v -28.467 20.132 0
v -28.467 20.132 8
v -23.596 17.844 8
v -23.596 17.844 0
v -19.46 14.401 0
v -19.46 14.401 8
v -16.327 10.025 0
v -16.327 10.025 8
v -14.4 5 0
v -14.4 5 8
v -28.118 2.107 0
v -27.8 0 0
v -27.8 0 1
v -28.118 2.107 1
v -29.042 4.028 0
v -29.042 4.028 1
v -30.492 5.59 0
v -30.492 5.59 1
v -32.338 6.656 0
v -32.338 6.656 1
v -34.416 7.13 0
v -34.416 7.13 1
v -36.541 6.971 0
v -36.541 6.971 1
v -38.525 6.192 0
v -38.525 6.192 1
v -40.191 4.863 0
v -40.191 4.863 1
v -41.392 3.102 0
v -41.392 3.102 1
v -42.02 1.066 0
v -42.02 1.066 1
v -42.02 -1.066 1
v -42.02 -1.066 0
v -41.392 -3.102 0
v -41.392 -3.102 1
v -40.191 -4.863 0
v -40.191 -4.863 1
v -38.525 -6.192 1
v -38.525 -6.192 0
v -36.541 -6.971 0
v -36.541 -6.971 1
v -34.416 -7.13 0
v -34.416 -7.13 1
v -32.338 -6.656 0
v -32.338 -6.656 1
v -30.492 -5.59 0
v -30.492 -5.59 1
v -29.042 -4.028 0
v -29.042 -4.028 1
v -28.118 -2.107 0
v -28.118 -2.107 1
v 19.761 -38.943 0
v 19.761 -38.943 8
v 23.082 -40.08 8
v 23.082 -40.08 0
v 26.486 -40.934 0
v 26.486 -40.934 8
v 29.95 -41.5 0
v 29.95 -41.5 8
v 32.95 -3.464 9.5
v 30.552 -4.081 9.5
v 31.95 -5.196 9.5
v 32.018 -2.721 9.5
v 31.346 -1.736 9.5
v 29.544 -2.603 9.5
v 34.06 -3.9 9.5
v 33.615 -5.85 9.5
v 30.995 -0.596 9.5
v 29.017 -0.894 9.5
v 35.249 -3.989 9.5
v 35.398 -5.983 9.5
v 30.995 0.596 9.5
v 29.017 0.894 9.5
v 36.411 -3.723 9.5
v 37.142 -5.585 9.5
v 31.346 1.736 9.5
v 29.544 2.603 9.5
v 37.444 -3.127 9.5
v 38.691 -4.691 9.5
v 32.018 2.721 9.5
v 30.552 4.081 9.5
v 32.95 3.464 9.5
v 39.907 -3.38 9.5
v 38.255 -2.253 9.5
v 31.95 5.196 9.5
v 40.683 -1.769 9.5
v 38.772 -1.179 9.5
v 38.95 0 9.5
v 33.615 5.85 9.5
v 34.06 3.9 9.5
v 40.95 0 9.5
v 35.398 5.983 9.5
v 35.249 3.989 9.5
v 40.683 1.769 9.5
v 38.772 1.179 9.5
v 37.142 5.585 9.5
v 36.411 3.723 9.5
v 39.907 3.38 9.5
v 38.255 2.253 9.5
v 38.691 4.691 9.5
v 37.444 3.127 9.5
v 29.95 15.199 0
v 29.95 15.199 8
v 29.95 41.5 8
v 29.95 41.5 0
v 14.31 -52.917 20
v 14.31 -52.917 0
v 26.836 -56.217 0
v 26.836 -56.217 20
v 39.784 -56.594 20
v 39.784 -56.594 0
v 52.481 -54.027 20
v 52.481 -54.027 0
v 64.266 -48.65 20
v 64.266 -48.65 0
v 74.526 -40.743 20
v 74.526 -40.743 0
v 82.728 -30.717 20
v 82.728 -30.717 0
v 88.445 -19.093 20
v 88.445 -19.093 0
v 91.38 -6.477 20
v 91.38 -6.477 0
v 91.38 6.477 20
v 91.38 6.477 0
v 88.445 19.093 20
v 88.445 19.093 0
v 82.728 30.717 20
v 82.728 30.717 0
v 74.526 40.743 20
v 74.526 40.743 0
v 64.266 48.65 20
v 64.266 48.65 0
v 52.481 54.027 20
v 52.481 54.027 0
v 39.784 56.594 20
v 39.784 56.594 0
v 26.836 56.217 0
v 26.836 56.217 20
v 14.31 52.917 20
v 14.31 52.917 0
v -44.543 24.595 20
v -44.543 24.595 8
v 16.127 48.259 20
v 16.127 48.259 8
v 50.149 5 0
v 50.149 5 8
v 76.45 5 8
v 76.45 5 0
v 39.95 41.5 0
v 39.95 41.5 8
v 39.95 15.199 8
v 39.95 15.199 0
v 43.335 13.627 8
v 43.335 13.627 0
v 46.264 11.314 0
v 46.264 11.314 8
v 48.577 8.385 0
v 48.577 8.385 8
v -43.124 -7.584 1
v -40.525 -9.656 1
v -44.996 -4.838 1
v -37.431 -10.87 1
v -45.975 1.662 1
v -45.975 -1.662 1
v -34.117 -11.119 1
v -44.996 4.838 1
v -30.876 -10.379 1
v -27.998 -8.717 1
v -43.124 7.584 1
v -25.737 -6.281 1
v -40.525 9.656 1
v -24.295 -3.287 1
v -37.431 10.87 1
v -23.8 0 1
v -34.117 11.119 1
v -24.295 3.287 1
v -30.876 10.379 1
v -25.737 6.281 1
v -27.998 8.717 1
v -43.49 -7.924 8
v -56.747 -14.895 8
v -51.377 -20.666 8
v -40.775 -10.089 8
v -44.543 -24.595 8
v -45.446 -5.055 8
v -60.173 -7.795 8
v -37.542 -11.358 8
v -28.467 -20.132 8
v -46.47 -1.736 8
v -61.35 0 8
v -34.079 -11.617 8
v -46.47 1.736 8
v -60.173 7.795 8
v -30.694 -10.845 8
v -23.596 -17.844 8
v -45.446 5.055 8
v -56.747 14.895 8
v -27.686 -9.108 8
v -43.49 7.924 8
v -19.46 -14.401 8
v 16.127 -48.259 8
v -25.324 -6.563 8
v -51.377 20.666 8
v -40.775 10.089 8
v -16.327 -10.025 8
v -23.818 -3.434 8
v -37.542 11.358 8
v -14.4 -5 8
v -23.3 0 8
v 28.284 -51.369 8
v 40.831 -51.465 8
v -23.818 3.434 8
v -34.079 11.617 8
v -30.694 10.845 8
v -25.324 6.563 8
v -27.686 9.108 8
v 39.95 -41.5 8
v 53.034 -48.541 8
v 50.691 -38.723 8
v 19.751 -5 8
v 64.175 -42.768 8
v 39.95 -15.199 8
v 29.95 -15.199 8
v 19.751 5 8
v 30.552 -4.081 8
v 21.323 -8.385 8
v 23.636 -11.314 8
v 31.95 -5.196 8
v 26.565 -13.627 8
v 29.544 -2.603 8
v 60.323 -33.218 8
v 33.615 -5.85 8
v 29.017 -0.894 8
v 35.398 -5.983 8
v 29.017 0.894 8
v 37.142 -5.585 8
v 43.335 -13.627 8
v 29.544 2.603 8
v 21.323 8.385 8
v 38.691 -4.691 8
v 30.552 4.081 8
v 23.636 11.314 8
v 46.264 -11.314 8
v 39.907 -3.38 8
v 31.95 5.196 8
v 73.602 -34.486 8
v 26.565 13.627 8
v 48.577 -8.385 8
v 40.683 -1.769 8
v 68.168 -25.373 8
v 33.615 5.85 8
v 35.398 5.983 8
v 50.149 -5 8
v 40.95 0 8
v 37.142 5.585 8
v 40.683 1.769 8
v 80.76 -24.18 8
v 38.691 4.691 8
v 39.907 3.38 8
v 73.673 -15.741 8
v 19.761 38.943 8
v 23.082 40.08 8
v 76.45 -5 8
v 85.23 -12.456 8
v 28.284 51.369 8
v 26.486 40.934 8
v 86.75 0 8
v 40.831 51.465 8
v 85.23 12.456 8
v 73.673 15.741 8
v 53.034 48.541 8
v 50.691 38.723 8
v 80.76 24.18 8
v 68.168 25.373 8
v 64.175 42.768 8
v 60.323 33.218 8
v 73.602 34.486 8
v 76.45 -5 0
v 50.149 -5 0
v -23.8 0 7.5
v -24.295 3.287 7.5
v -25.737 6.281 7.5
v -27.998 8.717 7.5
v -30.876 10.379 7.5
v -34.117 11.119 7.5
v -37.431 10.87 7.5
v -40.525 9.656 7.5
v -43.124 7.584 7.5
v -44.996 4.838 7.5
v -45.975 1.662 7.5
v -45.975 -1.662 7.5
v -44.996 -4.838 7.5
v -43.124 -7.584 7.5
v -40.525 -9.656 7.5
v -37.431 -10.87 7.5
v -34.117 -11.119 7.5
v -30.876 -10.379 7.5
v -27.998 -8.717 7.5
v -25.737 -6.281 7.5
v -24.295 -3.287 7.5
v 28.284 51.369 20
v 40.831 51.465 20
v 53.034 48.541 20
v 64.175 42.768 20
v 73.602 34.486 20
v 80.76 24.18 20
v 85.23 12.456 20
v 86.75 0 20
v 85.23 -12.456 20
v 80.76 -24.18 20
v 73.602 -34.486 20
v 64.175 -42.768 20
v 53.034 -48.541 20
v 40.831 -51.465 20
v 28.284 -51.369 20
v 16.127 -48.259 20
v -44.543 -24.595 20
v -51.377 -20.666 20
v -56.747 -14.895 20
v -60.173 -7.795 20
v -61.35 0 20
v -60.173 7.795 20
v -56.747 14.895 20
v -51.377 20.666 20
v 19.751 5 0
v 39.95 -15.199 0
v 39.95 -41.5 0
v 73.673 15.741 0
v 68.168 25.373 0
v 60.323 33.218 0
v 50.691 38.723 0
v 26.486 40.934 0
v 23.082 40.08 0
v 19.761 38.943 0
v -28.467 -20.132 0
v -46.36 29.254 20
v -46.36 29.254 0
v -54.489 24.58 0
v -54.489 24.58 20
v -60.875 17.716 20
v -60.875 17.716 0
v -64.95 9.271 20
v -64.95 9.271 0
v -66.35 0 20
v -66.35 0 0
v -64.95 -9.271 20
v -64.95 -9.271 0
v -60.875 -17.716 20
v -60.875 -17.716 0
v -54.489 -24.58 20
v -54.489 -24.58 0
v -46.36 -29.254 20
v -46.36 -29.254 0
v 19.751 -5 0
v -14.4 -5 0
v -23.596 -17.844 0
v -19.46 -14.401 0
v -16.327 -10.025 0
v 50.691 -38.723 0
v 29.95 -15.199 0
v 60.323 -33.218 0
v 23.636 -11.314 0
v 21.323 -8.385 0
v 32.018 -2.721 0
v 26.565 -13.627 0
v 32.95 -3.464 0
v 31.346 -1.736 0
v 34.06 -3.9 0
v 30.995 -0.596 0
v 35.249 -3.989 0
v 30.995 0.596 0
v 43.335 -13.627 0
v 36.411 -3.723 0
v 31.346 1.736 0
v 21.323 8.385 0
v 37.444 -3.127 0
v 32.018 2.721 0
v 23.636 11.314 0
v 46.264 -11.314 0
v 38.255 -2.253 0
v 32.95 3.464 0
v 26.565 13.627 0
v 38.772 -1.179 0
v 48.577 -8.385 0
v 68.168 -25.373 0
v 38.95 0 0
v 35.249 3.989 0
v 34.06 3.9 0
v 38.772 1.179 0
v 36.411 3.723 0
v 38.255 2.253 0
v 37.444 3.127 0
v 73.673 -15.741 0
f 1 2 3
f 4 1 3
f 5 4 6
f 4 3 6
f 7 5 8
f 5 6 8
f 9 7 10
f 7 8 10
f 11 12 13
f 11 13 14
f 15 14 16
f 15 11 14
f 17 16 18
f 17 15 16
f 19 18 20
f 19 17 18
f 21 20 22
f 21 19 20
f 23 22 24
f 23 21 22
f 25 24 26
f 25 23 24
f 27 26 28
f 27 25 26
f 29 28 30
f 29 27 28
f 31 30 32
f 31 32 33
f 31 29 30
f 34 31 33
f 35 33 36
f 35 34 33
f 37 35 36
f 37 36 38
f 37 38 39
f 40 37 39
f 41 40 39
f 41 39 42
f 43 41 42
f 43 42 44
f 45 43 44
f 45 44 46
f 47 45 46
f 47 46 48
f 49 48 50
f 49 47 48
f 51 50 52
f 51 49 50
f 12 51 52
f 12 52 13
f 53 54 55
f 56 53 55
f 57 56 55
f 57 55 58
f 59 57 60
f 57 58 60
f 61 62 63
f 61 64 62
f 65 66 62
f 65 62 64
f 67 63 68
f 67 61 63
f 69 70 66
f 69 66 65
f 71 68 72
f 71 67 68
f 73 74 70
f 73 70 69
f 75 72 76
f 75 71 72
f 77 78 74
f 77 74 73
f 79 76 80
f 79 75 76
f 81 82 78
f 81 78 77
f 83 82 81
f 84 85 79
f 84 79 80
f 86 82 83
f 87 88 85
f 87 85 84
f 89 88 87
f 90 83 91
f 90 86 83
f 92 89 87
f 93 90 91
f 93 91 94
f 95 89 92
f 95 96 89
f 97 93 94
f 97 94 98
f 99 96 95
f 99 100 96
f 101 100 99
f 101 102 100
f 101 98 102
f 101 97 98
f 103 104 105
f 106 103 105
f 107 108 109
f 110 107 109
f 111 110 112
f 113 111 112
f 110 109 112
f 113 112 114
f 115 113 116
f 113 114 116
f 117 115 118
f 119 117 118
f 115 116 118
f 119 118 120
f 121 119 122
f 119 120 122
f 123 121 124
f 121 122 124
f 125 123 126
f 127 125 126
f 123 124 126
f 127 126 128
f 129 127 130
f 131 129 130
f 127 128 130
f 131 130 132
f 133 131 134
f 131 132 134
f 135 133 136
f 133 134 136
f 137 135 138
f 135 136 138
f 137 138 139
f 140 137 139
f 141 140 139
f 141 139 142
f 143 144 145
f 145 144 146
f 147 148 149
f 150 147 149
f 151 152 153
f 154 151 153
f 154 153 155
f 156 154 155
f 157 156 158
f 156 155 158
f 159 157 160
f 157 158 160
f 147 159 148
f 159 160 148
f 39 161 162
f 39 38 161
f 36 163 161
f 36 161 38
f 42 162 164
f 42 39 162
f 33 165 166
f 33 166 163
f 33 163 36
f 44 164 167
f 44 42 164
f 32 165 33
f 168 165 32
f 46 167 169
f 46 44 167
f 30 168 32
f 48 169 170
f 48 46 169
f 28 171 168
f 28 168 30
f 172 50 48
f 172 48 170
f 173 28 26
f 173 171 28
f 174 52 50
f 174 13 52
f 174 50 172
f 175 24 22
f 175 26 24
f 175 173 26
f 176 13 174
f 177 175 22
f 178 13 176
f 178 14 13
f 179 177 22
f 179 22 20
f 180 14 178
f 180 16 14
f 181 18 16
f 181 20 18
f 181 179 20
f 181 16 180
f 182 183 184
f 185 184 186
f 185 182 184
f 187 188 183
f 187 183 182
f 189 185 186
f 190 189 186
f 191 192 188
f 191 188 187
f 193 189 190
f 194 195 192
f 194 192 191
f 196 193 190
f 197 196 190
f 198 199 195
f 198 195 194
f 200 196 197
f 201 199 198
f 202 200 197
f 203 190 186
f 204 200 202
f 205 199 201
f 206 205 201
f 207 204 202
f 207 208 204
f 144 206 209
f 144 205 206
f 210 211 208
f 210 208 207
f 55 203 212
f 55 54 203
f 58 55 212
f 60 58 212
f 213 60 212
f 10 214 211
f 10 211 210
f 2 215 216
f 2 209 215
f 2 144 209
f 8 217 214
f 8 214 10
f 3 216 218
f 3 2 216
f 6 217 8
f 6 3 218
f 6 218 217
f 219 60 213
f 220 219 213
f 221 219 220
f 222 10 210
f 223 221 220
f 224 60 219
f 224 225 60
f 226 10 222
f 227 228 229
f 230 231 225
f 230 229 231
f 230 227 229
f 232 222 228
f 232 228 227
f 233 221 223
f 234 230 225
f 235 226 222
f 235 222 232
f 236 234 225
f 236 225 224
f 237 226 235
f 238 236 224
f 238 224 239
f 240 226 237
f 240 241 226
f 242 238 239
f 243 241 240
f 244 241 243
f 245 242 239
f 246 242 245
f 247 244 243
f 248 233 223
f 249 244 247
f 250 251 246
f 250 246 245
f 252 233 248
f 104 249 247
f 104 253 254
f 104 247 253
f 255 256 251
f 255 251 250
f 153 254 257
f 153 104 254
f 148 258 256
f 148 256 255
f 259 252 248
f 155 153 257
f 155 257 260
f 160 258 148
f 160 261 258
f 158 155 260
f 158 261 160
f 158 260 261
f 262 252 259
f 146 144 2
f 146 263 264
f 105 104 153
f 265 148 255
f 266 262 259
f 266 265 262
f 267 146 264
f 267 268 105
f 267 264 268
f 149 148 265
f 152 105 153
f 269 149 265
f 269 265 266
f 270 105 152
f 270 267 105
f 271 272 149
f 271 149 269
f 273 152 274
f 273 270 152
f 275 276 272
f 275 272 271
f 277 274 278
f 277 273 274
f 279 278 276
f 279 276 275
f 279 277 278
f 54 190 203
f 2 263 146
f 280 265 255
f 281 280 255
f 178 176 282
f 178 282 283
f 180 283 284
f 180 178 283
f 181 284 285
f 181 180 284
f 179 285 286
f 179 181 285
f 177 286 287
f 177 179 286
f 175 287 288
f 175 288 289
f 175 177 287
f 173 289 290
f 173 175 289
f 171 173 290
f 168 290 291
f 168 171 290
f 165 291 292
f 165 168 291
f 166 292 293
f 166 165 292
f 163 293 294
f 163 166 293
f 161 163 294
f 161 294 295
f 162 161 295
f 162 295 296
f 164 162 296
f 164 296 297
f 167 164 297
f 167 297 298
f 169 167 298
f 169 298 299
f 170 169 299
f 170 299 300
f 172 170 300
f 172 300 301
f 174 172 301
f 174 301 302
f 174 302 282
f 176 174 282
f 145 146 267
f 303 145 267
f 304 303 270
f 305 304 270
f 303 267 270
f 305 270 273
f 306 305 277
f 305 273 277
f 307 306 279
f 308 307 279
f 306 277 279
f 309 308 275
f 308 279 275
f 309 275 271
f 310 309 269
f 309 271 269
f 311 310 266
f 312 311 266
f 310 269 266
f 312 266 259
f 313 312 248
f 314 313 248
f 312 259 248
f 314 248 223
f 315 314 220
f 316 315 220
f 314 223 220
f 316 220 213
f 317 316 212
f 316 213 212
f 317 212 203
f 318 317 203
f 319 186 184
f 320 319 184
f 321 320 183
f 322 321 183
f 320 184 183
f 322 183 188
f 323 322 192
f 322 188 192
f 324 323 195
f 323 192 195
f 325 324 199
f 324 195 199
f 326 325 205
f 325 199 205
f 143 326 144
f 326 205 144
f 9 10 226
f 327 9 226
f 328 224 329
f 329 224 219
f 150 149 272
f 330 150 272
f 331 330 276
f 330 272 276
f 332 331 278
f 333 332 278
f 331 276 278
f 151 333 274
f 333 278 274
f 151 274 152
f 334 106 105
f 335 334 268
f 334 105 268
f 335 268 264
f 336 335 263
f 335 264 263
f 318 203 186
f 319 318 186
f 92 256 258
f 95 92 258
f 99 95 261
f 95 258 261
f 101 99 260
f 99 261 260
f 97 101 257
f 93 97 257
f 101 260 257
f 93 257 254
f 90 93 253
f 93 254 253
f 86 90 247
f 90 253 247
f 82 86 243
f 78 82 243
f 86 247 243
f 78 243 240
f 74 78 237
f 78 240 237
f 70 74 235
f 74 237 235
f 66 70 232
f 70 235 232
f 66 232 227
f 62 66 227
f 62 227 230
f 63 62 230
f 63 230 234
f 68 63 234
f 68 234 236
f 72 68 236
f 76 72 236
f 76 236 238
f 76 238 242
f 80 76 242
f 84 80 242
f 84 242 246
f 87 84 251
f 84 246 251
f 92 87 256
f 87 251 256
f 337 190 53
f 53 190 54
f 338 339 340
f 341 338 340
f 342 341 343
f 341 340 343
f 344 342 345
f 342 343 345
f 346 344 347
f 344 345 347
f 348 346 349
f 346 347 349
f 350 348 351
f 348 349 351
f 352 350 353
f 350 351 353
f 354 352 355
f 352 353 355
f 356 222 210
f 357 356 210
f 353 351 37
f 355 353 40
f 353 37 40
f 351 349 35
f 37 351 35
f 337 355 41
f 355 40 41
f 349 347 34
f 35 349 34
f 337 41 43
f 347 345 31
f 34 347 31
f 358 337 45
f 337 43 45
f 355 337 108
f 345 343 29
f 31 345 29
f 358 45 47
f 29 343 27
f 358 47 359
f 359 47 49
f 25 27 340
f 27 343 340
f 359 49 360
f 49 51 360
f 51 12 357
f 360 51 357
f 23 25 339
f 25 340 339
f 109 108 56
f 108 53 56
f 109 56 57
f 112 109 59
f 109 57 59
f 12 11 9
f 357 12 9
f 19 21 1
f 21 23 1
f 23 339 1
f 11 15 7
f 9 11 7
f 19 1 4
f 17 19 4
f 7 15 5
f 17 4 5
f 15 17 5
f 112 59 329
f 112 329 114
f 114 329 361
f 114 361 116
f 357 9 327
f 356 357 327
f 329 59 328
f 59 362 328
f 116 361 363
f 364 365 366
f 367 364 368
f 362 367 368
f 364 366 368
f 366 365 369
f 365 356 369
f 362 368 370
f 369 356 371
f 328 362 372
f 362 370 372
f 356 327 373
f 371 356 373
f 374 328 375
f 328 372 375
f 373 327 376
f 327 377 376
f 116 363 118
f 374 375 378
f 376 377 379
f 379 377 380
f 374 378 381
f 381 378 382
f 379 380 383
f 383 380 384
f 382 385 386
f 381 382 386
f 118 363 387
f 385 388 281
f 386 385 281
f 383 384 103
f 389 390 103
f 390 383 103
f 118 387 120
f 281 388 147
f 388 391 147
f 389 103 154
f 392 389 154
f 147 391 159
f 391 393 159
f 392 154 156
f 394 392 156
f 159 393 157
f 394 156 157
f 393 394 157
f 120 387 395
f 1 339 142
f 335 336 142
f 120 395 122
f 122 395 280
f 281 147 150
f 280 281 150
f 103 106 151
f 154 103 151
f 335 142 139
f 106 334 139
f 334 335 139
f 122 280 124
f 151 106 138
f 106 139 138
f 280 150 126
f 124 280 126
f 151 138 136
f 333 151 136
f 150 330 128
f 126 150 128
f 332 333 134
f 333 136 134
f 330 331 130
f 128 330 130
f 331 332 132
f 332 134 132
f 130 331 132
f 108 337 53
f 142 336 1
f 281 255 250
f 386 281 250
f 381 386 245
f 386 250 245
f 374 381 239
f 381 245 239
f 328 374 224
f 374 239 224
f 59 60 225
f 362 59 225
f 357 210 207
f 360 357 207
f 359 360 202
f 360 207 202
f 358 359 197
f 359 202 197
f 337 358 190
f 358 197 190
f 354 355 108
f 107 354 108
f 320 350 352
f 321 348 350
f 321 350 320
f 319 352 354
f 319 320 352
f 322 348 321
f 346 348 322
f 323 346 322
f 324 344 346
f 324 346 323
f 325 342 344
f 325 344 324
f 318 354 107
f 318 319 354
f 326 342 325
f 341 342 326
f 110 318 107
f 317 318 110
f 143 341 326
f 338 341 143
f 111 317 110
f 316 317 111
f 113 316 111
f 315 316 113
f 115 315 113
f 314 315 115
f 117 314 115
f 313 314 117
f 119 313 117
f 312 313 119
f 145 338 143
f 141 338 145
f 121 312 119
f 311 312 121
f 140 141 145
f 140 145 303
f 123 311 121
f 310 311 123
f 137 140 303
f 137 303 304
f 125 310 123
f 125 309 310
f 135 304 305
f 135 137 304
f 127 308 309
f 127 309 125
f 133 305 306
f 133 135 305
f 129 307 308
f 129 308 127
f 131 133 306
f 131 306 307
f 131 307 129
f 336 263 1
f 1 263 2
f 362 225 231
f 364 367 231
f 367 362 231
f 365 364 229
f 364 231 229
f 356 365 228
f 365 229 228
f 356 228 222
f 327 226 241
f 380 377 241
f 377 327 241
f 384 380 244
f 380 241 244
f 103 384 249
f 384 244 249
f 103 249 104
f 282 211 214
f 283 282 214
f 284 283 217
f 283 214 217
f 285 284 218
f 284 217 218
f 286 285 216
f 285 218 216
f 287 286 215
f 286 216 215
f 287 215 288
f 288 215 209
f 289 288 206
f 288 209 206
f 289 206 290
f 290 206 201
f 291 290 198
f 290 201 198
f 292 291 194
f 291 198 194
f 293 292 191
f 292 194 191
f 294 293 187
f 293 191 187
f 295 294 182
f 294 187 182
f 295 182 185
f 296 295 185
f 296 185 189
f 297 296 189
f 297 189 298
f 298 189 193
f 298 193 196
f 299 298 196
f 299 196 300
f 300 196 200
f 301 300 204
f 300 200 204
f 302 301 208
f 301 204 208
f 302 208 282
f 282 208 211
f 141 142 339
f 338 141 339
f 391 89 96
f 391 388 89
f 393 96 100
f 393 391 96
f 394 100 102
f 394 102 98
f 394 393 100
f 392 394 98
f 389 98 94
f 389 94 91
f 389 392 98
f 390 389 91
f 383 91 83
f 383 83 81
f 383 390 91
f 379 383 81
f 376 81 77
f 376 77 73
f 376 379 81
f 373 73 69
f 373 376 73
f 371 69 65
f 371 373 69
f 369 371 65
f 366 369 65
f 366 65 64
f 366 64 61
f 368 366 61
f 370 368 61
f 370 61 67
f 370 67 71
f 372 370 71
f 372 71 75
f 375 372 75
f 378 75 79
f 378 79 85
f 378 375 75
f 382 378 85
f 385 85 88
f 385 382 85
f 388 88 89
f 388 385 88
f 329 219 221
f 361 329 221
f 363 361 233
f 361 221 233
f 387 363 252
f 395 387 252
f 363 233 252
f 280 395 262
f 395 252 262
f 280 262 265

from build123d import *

# Parameters (mm, degrees)
F0_R     = 11.15
F0_R_2   = 4
F1_DEPTH = 8
F0_R_3   = 7.15
F2_DEPTH = 1
F3_SIZE  = 0.5
F4_R     = 6
F4_R_2   = 4
F5_DEPTH = 1.5
F6_DEPTH = 20
F8_DEPTH = 25


with BuildPart() as f1:
    # F0 (on Top) → F1 (new body)
    with BuildSketch(Plane.XY):
        with BuildLine():
            ThreePointArc((14.310229, -52.917293), (91.75, 0), (14.310229, 52.917293))
            Line((14.310229, 52.917293), (-46.360014, 29.253574))
            ThreePointArc((-46.360014, 29.253574), (-66.35, 0), (-46.360014, -29.253574))
            Line((-46.360014, -29.253574), (14.310229, -52.917293))
        make_face()
        with BuildLine():
            Line((-44.543133, 24.595361), (16.12711, 48.25908))
            ThreePointArc((16.12711, 48.25908), (86.75, 0), (16.12711, -48.25908))
            Line((16.12711, -48.25908), (-44.543133, -24.595361))
            ThreePointArc((-44.543133, -24.595361), (-61.35, 0), (-44.543133, 24.595361))
        make_face(mode=Mode.SUBTRACT)
        with BuildLine():
            ThreePointArc((16.12711, -48.25908), (86.75, 0), (16.12711, 48.25908))
            Line((16.12711, 48.25908), (-44.543133, 24.595361))
            ThreePointArc((-44.543133, 24.595361), (-61.35, 0), (-44.543133, -24.595361))
            Line((-44.543133, -24.595361), (16.12711, -48.25908))
        make_face()
        with Locations((-34.95, 0)):
            Circle(F0_R, mode=Mode.SUBTRACT)
        with Locations((34.95, 0)):
            Circle(F0_R_2, mode=Mode.SUBTRACT)
    extrude(amount=F1_DEPTH)

    # F0 (on Top) → F2 (join)
    with BuildSketch(Plane.XY):
        with Locations((-34.95, 0)):
            Circle(F0_R)
        with Locations((-34.95, 0)):
            Circle(F0_R_3, mode=Mode.SUBTRACT)
    extrude(amount=F2_DEPTH)

    # F3
    f3_edges = [f1.edges().sort_by_distance(p)[0] for p in [
        (-46.1, 0, 8),
    ]]
    chamfer(f3_edges, length=F3_SIZE)

    # F4 (on face) → F5 (join)
    with BuildSketch(Plane.XY.offset(8)):
        with Locations((34.95, 0)):
            Circle(F4_R)
        with Locations((34.95, 0)):
            Circle(F4_R_2, mode=Mode.SUBTRACT)
    extrude(amount=F5_DEPTH)

    # F0 (on Top) → F6 (join)
    with BuildSketch(Plane.XY):
        with BuildLine():
            ThreePointArc((14.310229, -52.917293), (91.75, 0), (14.310229, 52.917293))
            Line((14.310229, 52.917293), (-46.360014, 29.253574))
            ThreePointArc((-46.360014, 29.253574), (-66.35, 0), (-46.360014, -29.253574))
            Line((-46.360014, -29.253574), (14.310229, -52.917293))
        make_face()
        with BuildLine():
            Line((-44.543133, 24.595361), (16.12711, 48.25908))
            ThreePointArc((16.12711, 48.25908), (86.75, 0), (16.12711, -48.25908))
            Line((16.12711, -48.25908), (-44.543133, -24.595361))
            ThreePointArc((-44.543133, -24.595361), (-61.35, 0), (-44.543133, 24.595361))
        make_face(mode=Mode.SUBTRACT)
    extrude(amount=F6_DEPTH)

    # F7 (on face) → F8 (cut)
    with BuildSketch(Plane.XY.offset(8)):
        with BuildLine():
            ThreePointArc((29.95, 41.49988), (24.774782, 40.542631), (19.760873, 38.942655))
            Line((19.760873, 38.942655), (-28.467059, 20.131915))
            ThreePointArc((-28.467059, 20.131915), (-19.459834, 14.400599), (-14.399513, 5))
            Line((-14.399513, 5), (19.751316, 5))
            ThreePointArc((19.751316, 5), (23.636292, 11.313708), (29.95, 15.198684))
            Line((29.95, 15.198684), (29.95, 41.49988))
        make_face()
        with BuildLine():
            ThreePointArc((76.44988, 5), (64.507063, 29.557063), (39.95, 41.49988))
            Line((39.95, 41.49988), (39.95, 15.198684))
            ThreePointArc((39.95, 15.198684), (46.263708, 11.313708), (50.148684, 5))
            Line((50.148684, 5), (76.44988, 5))
        make_face()
        with BuildLine():
            Line((19.751316, -5), (-14.399513, -5))
            ThreePointArc((-14.399513, -5), (-19.459834, -14.400599), (-28.467059, -20.131915))
            Line((-28.467059, -20.131915), (19.760873, -38.942655))
            ThreePointArc((19.760873, -38.942655), (24.774782, -40.542631), (29.95, -41.49988))
            Line((29.95, -41.49988), (29.95, -15.198684))
            ThreePointArc((29.95, -15.198684), (23.636292, -11.313708), (19.751316, -5))
        make_face()
        with BuildLine():
            ThreePointArc((39.95, -41.49988), (64.507063, -29.557063), (76.44988, -5))
            Line((76.44988, -5), (50.148684, -5))
            ThreePointArc((50.148684, -5), (46.263708, -11.313708), (39.95, -15.198684))
            Line((39.95, -15.198684), (39.95, -41.49988))
        make_face()
    extrude(amount=-F8_DEPTH, mode=Mode.SUBTRACT)


solid = f1.part
